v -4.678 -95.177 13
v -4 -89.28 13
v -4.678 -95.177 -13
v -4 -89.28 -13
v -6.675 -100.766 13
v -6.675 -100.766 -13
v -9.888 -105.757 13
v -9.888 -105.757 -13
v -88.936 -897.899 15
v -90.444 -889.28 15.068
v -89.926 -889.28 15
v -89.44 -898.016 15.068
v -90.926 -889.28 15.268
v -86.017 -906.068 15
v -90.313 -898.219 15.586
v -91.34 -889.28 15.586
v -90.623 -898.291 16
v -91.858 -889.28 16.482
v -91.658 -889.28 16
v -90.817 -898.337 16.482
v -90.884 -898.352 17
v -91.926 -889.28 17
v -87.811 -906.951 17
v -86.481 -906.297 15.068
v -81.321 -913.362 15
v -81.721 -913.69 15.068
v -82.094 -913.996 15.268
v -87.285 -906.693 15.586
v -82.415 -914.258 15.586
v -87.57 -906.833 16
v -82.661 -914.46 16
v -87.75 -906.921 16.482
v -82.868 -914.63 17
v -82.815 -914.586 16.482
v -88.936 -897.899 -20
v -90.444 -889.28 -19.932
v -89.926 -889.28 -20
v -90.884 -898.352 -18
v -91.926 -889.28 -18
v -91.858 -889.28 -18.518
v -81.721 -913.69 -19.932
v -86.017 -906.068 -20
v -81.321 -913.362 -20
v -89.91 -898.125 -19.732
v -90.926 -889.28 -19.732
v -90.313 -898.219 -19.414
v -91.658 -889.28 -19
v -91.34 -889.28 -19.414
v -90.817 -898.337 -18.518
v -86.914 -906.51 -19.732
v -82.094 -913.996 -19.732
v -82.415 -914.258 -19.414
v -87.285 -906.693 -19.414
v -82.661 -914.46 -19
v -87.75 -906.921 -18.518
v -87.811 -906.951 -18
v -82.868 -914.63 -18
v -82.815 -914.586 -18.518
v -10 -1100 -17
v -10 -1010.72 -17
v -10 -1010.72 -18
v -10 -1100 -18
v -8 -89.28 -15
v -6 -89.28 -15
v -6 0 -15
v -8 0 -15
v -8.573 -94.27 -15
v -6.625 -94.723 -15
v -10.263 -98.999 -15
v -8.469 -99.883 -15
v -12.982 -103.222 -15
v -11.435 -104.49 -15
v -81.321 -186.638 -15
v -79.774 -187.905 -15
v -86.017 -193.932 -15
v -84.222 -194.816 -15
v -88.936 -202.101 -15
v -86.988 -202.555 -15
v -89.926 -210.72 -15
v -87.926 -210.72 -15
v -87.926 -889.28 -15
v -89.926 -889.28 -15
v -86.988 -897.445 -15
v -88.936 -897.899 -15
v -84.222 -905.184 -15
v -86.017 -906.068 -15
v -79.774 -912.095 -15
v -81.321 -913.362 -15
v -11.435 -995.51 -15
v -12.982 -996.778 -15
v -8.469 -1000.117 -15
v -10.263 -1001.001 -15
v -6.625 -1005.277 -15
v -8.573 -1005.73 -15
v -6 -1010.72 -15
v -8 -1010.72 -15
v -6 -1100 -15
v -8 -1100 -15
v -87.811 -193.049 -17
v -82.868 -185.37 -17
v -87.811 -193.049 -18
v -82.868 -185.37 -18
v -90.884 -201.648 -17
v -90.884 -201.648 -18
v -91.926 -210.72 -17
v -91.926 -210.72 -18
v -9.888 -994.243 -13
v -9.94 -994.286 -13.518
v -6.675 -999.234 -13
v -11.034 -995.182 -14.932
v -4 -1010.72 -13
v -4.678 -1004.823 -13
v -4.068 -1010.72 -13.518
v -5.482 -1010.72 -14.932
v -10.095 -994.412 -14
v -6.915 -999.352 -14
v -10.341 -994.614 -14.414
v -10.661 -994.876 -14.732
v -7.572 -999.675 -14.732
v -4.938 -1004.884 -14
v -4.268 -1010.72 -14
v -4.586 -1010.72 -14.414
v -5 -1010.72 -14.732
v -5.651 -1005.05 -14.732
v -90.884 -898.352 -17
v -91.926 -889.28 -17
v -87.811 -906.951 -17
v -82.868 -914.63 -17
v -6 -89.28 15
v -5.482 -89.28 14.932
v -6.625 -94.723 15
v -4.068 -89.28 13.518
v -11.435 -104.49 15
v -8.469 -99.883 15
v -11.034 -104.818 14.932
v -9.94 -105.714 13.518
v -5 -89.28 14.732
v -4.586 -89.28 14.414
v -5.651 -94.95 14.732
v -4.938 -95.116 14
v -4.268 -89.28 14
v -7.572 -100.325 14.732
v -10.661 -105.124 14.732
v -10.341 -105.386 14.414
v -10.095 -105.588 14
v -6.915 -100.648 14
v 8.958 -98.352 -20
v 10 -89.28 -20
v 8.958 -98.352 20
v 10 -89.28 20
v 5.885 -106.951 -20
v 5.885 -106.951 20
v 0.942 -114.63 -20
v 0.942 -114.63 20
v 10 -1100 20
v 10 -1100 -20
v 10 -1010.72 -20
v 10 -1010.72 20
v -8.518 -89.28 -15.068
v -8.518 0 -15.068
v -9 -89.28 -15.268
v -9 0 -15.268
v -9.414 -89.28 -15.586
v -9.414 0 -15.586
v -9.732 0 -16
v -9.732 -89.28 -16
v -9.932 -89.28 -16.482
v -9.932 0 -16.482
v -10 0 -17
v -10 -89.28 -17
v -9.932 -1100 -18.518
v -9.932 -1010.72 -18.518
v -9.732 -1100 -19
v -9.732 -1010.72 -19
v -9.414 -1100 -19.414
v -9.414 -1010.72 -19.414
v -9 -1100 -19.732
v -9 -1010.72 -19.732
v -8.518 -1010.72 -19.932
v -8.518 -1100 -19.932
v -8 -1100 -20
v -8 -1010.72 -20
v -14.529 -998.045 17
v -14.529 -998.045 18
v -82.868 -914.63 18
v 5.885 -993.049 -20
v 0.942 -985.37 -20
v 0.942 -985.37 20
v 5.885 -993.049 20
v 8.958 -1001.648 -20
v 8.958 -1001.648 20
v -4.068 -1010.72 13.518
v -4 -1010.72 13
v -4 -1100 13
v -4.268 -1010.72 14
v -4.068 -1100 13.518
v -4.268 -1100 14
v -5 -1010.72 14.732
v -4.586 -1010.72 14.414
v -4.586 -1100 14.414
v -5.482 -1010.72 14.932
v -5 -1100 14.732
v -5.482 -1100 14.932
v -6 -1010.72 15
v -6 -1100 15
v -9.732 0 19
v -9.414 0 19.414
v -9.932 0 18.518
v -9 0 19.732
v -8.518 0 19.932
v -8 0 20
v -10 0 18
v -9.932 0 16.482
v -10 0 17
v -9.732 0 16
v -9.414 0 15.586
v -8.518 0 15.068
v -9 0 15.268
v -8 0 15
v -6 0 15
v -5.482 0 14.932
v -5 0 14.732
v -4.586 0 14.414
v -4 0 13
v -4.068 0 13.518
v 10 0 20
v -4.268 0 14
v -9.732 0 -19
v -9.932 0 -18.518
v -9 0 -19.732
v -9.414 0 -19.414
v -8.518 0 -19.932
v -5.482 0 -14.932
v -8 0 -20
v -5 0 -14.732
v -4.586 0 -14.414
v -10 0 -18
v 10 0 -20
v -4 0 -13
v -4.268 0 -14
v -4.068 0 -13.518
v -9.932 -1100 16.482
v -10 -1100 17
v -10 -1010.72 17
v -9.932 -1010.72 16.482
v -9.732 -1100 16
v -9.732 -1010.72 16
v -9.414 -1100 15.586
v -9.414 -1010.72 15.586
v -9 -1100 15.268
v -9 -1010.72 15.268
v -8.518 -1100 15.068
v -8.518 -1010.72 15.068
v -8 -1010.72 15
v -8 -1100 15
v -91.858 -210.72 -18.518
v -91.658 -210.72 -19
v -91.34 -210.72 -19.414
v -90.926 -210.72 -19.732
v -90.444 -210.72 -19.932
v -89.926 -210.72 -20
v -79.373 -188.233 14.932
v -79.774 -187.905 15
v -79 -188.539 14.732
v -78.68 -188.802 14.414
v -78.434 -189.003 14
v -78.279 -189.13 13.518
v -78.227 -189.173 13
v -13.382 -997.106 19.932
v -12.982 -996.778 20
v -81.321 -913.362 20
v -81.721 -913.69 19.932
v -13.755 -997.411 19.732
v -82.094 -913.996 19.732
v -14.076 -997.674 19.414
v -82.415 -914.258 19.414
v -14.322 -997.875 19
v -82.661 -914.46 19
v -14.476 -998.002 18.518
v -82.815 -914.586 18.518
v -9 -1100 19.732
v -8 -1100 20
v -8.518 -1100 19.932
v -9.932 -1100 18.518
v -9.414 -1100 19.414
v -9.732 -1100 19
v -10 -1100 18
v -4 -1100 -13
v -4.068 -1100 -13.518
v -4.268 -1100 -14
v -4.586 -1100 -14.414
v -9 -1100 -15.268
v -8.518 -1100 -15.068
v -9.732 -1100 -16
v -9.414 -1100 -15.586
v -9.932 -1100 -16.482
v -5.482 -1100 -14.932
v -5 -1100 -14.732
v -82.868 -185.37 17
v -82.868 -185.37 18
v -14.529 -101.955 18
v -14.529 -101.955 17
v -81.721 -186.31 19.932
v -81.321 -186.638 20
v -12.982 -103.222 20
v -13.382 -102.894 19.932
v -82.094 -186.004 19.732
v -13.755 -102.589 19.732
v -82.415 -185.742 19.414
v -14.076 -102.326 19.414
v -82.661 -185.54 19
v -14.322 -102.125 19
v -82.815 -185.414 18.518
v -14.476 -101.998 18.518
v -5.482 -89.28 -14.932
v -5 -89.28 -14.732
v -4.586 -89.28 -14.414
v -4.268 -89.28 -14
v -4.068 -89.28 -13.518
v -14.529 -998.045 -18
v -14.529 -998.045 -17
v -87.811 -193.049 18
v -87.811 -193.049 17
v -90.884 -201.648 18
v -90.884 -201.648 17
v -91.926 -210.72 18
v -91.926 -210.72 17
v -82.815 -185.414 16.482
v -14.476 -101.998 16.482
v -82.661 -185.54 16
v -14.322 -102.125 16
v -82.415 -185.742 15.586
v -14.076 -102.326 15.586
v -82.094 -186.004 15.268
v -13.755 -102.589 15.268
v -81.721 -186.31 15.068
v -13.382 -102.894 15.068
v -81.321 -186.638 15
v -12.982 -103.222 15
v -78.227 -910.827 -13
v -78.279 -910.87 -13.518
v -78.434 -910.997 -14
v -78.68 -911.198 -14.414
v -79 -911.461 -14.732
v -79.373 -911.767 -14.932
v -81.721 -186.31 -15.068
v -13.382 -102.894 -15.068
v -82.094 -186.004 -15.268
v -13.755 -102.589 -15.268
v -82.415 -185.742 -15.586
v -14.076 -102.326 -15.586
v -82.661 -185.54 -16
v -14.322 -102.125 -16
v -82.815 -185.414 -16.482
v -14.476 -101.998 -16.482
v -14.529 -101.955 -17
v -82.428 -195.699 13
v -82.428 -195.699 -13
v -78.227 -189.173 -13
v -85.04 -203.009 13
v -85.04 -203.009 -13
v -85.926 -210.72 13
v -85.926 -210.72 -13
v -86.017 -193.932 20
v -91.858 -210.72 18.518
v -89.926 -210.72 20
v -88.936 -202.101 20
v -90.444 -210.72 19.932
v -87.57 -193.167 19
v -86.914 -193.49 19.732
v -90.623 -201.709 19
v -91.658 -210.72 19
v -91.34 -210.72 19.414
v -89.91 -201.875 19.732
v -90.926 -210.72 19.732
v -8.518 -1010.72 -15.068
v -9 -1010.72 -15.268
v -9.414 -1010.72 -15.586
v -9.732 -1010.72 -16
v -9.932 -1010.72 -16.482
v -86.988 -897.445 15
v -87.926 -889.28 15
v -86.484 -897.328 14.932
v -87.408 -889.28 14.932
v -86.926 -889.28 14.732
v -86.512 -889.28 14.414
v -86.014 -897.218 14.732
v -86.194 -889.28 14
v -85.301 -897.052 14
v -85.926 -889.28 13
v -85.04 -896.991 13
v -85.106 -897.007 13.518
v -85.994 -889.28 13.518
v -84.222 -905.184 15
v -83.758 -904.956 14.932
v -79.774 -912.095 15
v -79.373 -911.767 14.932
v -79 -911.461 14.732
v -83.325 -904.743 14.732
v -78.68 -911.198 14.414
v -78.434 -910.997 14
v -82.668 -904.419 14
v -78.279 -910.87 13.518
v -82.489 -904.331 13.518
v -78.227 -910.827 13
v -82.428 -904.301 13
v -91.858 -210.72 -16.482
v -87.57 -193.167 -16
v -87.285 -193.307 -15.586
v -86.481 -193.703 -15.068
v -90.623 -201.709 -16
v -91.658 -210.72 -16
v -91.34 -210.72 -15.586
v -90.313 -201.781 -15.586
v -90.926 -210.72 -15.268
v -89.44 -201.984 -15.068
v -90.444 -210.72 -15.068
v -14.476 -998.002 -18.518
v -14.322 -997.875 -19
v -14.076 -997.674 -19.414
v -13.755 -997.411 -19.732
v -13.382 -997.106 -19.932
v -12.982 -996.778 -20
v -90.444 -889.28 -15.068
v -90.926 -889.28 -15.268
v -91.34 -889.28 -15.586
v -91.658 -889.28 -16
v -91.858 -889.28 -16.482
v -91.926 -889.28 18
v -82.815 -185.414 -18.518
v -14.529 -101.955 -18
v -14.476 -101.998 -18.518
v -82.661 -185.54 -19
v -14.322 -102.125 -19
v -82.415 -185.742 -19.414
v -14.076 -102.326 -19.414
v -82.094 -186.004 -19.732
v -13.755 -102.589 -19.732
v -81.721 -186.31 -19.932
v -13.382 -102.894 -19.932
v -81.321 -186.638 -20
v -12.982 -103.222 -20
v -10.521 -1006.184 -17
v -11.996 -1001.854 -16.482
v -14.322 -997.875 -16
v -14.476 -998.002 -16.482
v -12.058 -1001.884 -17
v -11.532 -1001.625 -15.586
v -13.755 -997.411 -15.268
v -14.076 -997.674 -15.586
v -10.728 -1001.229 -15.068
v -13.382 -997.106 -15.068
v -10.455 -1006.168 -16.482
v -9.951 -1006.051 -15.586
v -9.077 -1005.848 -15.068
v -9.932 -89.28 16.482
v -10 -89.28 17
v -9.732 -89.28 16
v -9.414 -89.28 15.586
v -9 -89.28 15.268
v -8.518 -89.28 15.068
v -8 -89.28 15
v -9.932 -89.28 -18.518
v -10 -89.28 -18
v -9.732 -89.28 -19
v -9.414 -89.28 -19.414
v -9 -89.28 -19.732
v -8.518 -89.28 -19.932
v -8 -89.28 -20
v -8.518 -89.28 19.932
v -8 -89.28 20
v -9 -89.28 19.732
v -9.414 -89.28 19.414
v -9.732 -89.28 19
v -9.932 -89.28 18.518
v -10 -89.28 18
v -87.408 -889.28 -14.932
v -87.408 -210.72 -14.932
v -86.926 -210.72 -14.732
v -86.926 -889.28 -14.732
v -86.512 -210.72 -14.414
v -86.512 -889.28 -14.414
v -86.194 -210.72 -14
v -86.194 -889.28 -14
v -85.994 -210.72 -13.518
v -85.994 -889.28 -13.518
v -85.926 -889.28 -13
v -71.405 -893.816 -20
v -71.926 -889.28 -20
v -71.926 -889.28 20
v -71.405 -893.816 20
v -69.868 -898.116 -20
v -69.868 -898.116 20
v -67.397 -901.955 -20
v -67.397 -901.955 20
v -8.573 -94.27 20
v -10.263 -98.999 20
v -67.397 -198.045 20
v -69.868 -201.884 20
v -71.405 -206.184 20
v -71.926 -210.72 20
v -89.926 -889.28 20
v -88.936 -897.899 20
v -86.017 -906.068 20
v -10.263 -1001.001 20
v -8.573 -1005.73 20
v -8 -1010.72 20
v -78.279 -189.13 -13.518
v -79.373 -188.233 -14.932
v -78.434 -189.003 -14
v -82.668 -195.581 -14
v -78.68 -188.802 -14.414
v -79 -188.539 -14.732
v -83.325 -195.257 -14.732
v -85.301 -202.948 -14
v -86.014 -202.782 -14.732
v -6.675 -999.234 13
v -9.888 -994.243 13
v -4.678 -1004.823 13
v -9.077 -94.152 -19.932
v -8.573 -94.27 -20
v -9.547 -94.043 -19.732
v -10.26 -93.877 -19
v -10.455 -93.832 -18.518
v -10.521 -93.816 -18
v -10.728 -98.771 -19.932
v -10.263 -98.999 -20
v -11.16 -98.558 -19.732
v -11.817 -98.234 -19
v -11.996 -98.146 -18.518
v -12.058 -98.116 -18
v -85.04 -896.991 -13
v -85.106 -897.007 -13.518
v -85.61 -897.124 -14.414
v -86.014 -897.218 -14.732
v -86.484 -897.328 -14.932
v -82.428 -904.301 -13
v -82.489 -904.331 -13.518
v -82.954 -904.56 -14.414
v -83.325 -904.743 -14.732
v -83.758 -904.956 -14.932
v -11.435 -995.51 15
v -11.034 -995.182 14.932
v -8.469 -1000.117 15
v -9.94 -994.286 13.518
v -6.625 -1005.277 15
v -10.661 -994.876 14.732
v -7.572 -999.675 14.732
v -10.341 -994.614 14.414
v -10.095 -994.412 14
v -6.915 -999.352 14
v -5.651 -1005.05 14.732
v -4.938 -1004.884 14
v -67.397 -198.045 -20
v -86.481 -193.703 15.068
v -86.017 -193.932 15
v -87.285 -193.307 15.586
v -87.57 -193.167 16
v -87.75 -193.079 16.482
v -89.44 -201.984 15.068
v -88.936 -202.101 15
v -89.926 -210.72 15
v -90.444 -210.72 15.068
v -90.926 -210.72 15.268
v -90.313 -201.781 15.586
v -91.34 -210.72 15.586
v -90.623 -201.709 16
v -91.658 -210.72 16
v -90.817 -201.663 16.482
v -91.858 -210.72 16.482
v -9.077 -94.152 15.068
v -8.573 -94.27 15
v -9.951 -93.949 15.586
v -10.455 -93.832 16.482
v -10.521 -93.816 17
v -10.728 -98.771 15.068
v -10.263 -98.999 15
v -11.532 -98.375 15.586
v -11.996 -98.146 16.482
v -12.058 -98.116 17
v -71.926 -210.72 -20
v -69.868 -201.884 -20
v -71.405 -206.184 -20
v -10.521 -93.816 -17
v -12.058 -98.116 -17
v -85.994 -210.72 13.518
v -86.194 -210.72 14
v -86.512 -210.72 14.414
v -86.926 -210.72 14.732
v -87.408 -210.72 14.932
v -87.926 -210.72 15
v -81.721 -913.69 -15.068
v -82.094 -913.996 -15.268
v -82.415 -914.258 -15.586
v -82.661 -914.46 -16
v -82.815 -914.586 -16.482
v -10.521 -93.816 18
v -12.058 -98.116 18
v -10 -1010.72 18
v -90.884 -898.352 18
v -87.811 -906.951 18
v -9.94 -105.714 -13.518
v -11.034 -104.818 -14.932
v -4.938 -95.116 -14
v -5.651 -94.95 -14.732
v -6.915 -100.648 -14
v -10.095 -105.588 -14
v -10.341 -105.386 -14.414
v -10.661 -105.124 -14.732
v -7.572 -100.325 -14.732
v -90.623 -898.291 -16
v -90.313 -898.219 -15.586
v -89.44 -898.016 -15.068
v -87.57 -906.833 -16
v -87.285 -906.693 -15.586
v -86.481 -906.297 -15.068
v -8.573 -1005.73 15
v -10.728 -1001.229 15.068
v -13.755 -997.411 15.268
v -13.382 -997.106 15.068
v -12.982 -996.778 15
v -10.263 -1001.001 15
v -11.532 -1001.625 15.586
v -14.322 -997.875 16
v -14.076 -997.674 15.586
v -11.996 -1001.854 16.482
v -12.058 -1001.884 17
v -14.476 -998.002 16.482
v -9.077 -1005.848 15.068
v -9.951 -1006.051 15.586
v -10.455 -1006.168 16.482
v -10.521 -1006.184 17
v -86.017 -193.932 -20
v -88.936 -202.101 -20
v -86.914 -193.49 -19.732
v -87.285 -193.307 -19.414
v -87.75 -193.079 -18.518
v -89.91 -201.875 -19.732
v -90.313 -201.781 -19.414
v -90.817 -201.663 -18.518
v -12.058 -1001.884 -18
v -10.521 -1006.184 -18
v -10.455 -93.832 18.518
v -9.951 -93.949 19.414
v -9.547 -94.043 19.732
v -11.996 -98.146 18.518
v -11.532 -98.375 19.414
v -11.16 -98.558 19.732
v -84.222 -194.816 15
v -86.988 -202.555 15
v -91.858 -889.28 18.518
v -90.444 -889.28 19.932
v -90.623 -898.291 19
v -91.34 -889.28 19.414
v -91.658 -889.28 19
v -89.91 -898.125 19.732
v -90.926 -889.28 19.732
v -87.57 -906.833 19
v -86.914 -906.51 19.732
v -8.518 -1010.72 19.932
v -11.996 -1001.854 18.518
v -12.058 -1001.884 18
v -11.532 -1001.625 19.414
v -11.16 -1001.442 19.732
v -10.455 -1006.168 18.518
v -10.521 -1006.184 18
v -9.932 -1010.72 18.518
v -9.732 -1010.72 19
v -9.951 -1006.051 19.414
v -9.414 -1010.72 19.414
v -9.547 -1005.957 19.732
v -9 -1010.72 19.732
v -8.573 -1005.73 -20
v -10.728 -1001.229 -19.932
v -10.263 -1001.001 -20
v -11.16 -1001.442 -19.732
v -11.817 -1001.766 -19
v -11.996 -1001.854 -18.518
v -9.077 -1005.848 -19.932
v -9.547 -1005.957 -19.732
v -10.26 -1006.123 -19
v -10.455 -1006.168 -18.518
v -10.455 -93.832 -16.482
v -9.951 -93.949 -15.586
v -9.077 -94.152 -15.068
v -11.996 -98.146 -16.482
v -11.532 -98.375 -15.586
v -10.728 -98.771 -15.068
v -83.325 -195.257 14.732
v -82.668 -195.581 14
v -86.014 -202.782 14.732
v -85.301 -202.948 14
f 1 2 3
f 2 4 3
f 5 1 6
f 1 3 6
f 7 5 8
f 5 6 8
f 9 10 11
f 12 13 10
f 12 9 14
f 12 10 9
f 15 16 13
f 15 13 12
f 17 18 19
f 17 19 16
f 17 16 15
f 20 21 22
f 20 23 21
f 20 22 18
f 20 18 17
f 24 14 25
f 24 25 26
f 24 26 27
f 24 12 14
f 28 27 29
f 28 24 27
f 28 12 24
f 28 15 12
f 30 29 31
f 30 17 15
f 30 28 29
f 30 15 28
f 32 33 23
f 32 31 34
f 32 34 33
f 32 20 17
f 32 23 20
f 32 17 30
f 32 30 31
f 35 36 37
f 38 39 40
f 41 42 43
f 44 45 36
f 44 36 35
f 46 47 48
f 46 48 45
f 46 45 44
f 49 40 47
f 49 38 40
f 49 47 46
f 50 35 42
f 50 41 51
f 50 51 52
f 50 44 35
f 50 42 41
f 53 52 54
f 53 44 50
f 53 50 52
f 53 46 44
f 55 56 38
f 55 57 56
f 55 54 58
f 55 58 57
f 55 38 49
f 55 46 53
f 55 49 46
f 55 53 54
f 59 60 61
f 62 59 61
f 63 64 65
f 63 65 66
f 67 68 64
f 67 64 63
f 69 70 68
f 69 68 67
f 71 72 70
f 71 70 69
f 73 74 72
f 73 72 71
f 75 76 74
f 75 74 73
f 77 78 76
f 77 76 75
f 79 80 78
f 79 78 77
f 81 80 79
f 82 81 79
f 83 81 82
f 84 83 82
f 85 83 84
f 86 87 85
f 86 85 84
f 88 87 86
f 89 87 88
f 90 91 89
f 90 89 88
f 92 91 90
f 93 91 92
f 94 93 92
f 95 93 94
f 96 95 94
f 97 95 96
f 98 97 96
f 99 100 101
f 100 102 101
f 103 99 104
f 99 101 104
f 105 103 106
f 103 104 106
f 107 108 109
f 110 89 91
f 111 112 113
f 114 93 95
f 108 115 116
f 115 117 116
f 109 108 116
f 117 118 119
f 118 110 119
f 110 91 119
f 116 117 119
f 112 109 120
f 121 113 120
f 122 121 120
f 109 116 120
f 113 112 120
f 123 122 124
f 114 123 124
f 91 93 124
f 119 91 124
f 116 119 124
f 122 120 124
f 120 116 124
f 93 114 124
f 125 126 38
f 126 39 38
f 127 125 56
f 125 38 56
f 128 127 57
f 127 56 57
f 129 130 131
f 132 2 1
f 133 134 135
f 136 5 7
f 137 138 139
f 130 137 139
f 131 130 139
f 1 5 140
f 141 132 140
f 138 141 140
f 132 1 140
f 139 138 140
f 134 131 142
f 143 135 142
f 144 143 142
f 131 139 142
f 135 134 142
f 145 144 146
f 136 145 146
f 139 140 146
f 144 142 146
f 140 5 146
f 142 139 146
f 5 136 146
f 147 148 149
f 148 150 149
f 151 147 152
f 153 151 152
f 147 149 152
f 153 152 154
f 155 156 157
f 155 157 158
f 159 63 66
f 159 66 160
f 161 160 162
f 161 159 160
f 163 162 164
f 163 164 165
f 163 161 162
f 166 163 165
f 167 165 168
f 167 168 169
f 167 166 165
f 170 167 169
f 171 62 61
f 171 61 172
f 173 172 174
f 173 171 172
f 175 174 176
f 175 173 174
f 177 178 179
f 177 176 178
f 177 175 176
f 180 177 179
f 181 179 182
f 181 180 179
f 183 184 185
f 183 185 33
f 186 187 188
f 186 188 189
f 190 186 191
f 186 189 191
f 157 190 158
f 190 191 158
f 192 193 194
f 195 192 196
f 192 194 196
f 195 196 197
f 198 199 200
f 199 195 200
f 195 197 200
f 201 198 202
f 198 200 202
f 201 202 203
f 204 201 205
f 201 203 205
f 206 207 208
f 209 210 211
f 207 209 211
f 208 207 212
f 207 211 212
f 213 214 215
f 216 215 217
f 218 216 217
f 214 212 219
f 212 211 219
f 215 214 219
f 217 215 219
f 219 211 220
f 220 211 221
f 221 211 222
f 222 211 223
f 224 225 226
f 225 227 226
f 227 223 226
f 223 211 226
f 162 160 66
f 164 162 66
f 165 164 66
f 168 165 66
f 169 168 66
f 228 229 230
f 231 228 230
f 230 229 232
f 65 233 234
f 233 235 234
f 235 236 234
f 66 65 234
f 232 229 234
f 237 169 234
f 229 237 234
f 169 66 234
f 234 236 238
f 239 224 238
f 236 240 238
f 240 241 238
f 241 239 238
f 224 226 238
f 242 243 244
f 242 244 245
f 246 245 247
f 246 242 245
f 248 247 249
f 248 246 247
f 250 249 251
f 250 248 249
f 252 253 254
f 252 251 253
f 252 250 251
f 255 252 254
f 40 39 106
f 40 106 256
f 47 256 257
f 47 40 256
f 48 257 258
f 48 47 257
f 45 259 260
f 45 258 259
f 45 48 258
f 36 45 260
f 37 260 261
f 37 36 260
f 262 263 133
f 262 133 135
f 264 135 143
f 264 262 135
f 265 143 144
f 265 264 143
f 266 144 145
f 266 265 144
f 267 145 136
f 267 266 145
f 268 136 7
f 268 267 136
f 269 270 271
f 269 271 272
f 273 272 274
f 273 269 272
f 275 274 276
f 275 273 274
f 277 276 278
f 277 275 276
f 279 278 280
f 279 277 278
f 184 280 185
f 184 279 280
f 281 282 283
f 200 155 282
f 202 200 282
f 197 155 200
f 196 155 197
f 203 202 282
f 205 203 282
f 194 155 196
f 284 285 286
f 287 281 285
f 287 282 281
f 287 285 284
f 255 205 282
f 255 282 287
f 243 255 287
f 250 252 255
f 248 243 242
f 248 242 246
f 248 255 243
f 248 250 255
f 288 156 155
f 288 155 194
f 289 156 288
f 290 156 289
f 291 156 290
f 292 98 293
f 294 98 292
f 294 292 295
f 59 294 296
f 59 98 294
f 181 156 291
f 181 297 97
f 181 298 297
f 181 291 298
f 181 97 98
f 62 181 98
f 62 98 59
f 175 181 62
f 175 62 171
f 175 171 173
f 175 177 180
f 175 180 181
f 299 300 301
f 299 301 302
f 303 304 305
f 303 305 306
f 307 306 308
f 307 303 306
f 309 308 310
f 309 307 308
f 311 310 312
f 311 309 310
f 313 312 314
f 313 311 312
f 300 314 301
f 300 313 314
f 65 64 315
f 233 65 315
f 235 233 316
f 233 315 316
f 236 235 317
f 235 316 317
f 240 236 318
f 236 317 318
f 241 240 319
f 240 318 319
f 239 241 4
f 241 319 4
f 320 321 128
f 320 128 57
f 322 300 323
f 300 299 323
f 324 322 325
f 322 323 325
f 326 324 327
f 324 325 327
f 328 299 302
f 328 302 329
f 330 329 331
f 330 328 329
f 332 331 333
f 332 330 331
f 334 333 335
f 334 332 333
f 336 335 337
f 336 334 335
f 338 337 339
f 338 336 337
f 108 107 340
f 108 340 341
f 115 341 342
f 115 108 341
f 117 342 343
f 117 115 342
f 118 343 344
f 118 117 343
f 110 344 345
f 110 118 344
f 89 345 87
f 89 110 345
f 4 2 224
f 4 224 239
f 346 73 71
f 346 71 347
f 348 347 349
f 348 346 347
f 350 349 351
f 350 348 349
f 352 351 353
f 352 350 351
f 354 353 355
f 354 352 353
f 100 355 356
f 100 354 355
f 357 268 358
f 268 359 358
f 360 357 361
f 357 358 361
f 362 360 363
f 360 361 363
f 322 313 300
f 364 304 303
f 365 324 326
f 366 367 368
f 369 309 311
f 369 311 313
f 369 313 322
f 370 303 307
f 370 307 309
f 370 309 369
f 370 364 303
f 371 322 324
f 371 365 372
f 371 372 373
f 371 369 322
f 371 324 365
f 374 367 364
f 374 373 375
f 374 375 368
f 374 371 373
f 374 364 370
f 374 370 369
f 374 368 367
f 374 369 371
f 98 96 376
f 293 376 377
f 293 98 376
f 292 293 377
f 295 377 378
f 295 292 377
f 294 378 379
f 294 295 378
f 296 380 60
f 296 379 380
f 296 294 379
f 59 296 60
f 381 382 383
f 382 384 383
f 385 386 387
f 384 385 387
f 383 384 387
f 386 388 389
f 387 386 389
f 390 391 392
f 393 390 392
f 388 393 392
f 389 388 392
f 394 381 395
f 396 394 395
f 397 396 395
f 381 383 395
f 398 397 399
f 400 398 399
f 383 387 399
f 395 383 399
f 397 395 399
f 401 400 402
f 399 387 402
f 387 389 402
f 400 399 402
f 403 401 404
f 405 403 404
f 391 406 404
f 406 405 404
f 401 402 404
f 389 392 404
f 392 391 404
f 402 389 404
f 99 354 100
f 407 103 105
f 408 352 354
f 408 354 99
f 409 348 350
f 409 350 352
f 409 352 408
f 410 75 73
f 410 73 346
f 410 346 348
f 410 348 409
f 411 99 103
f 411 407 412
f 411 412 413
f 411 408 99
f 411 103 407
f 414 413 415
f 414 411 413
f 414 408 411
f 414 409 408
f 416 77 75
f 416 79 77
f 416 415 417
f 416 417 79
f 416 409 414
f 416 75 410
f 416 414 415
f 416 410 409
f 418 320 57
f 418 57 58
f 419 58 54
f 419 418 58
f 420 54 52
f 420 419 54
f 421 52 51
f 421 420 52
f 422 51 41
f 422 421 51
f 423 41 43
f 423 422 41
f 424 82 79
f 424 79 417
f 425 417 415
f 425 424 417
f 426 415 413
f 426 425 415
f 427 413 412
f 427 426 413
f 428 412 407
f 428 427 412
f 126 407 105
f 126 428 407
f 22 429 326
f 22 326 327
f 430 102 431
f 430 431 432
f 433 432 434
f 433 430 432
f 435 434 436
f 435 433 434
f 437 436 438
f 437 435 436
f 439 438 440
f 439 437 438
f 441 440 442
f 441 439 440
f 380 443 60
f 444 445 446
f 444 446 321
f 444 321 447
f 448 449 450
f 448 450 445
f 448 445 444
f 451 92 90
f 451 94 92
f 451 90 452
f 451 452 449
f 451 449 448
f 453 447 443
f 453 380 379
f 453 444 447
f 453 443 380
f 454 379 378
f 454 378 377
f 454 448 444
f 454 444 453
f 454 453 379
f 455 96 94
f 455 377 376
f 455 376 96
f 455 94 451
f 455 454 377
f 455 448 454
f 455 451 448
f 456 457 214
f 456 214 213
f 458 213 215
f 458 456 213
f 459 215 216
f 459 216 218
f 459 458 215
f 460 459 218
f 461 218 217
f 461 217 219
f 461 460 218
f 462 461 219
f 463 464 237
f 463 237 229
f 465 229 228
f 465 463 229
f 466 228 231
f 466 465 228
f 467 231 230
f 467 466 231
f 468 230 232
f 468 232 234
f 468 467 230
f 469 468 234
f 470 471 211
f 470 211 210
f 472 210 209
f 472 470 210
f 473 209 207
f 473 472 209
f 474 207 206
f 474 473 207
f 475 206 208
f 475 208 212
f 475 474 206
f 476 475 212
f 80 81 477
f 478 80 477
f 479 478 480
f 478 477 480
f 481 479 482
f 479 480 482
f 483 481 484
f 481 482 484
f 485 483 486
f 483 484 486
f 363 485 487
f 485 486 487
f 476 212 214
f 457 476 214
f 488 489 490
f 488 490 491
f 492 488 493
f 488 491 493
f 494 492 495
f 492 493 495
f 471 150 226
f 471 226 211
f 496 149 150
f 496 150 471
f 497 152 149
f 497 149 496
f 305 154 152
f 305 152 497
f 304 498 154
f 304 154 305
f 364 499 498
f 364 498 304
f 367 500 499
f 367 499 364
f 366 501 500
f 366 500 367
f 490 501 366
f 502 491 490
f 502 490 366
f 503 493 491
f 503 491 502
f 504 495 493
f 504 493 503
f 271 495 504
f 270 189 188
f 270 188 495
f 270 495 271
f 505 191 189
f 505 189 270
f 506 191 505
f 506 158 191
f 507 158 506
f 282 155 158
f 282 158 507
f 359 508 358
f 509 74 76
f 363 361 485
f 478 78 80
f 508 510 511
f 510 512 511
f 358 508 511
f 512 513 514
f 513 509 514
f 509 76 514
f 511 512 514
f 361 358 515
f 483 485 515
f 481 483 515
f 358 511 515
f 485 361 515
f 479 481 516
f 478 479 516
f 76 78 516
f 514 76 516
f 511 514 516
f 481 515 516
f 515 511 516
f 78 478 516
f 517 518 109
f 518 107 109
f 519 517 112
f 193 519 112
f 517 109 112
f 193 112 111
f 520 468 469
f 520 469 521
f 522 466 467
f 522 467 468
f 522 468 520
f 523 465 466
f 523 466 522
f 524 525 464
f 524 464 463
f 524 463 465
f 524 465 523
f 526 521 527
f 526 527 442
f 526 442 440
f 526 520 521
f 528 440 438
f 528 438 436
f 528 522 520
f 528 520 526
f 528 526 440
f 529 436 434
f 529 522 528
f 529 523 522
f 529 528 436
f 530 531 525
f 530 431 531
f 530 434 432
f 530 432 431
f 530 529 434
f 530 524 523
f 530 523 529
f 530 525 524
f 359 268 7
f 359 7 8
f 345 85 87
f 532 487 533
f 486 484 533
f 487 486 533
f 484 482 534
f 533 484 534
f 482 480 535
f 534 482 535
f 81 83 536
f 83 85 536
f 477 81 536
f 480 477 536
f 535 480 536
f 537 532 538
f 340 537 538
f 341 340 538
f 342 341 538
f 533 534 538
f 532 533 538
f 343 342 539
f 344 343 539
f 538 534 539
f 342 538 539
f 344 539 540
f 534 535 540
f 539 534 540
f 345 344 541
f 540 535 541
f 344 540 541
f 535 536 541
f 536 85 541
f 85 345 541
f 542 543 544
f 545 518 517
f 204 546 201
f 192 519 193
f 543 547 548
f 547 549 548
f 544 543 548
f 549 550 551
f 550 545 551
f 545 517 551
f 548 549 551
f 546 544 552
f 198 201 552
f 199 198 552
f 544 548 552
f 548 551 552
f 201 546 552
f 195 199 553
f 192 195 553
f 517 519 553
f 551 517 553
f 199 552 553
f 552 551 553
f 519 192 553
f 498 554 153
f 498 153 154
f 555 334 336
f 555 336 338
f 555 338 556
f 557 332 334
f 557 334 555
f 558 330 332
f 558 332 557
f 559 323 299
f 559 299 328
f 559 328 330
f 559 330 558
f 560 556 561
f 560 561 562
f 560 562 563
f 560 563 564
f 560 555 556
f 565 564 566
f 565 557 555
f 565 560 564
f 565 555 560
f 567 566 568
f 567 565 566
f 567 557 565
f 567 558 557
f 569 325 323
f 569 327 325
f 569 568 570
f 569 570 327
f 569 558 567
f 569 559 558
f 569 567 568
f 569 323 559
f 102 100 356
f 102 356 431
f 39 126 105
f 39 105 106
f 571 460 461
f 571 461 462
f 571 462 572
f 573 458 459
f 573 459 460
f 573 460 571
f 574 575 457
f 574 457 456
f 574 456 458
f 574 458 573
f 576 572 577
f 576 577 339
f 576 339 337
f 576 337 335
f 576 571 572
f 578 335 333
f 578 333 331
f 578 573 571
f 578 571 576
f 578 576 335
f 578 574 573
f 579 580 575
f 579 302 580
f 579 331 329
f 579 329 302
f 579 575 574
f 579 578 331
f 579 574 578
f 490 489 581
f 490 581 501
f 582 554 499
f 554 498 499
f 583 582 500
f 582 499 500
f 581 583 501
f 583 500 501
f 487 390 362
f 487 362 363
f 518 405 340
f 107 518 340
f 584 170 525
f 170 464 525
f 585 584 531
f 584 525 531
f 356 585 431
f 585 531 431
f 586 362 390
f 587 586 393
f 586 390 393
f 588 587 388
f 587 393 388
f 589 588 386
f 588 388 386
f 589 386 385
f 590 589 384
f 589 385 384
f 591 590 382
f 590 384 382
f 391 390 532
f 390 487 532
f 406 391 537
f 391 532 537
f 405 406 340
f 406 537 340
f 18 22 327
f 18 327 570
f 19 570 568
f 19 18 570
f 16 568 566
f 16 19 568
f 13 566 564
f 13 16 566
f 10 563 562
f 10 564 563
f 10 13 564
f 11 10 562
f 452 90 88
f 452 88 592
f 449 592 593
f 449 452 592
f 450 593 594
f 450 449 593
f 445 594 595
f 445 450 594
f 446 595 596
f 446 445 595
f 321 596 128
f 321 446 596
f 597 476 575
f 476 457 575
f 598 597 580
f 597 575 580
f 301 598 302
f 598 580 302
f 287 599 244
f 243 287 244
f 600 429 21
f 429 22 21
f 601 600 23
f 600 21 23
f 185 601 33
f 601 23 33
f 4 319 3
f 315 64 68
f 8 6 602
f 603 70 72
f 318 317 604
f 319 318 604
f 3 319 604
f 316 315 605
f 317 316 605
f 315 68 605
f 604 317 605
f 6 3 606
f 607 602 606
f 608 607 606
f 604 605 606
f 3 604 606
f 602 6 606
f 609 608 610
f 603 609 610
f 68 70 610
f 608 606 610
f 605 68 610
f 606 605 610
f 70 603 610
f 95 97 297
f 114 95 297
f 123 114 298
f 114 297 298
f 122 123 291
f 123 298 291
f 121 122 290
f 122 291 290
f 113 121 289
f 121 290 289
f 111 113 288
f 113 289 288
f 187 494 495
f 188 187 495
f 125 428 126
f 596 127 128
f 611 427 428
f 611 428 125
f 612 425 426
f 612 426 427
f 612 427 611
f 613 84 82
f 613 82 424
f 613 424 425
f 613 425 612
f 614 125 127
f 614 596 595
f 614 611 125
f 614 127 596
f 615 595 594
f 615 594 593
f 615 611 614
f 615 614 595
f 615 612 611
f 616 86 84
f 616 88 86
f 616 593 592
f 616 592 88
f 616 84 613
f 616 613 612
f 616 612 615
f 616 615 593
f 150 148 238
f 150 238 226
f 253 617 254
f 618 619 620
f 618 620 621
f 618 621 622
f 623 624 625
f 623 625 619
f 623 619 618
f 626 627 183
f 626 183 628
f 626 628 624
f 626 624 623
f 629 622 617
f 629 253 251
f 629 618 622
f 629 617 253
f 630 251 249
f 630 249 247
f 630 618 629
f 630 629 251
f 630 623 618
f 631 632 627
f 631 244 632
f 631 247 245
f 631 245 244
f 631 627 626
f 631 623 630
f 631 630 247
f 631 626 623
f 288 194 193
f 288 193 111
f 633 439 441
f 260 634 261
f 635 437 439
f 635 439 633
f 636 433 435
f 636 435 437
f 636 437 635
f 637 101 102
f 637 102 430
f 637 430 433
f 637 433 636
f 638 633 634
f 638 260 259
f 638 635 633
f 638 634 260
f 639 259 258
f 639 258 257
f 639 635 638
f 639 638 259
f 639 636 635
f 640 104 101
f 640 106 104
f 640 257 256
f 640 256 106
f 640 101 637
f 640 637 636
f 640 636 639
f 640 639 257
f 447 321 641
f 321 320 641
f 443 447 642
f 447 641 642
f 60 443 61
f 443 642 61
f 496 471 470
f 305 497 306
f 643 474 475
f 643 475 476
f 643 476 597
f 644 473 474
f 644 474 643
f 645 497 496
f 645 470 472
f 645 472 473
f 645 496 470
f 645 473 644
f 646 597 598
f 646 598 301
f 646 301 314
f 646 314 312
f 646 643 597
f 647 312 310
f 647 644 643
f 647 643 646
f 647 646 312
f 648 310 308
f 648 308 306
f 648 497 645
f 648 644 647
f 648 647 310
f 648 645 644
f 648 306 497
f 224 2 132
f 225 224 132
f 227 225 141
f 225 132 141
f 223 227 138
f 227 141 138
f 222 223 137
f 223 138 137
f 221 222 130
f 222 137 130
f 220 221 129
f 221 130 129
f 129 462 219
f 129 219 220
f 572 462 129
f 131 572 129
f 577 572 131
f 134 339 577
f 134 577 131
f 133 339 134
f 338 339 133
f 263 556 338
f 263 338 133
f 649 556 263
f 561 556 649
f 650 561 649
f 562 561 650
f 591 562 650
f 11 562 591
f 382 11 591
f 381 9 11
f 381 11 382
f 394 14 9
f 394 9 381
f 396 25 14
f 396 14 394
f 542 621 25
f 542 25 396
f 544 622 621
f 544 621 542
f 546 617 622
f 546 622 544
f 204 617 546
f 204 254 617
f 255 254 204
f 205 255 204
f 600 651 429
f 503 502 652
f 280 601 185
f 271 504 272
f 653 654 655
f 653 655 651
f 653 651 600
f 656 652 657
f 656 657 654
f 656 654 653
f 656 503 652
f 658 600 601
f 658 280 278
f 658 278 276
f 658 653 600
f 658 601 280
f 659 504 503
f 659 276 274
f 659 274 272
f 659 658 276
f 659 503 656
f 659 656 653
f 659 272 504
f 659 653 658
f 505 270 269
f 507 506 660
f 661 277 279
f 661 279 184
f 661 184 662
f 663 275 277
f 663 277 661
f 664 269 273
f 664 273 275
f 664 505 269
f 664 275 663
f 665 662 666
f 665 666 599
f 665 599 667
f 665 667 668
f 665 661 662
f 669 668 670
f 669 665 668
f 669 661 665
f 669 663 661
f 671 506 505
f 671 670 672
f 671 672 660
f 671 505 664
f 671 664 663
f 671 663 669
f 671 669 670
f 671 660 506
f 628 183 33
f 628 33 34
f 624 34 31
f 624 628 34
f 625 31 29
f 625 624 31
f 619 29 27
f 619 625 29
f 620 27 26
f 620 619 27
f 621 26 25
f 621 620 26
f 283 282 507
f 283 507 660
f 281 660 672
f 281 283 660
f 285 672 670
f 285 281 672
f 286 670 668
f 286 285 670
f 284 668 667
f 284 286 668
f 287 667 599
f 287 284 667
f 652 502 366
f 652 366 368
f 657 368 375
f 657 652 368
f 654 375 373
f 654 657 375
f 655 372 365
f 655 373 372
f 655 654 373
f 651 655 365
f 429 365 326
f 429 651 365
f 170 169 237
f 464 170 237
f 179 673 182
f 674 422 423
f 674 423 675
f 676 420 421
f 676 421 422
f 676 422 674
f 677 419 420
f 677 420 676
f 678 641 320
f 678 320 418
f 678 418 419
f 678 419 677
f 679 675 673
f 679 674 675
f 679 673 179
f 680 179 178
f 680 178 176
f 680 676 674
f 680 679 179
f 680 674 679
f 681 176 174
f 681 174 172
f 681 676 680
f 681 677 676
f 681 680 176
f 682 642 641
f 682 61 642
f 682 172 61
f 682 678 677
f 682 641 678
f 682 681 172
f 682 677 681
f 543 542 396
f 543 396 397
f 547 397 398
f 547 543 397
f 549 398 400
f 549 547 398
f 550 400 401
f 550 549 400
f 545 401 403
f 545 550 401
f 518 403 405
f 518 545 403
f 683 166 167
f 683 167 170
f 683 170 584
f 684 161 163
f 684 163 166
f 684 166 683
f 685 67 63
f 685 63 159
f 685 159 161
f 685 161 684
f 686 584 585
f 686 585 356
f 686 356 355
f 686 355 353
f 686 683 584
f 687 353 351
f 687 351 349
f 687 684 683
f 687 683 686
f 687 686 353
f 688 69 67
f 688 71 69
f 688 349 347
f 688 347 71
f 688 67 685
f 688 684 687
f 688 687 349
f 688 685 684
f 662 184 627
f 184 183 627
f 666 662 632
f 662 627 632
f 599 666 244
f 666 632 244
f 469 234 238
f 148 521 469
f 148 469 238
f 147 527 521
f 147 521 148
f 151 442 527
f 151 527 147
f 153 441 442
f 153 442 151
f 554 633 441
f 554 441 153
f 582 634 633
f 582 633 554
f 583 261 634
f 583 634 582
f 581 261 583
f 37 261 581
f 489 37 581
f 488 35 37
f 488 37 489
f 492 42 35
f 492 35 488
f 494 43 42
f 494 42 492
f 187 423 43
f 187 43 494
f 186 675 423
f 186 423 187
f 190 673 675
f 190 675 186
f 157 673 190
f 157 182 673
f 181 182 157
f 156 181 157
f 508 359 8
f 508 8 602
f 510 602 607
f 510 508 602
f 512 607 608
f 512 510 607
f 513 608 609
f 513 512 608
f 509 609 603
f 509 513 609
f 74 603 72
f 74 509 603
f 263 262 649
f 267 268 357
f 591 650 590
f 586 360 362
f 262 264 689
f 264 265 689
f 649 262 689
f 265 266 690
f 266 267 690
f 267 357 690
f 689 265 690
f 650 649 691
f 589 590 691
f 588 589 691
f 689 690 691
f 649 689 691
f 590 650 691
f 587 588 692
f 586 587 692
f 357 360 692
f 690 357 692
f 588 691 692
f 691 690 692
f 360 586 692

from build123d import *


with BuildPart() as f2:
    # F2: sweep along a path in F1
    with BuildLine(Plane.XY) as f2_path:
        Line((0, 0), (0, -89.280188))
        ThreePointArc((0, -89.280188), (-1.749391, -99.374895), (-6.793541, -108.292296))
        Line((-6.793541, -108.292296), (-75.132394, -191.707704))
        ThreePointArc((-75.132394, -191.707704), (-80.176544, -200.625105), (-81.925935, -210.719812))
        Line((-81.925935, -210.719812), (-81.925935, -550))
        Line((-81.925935, -550), (-81.925935, -889.280188))
        ThreePointArc((-81.925935, -889.280188), (-80.176544, -899.374895), (-75.132394, -908.292296))
        Line((-75.132394, -908.292296), (-6.793541, -991.707704))
        ThreePointArc((-6.793541, -991.707704), (-1.749391, -1000.625105), (0, -1010.719812))
        Line((0, -1010.719812), (0, -1100))
    # F0 (on Front) → F2 (sweep)
    with BuildSketch(Plane.XZ):
        with BuildLine():
            Line((10, 20), (-8, 20))
            ThreePointArc((-8, 20), (-9.414214, 19.414214), (-10, 18))
            Line((-10, 18), (-10, 17))
            ThreePointArc((-10, 17), (-9.414214, 15.585786), (-8, 15))
            Line((-8, 15), (-6, 15))
            ThreePointArc((-6, 15), (-4.585786, 14.414214), (-4, 13))
            Line((-4, 13), (-4, -13))
            ThreePointArc((-4, -13), (-4.585786, -14.414214), (-6, -15))
            Line((-6, -15), (-8, -15))
            ThreePointArc((-8, -15), (-9.414214, -15.585786), (-10, -17))
            Line((-10, -17), (-10, -18))
            ThreePointArc((-10, -18), (-9.414214, -19.414214), (-8, -20))
            Line((-8, -20), (10, -20))
            Line((10, -20), (10, 20))
        make_face()
    sweep(path=f2_path.line)


solid = f2.part
